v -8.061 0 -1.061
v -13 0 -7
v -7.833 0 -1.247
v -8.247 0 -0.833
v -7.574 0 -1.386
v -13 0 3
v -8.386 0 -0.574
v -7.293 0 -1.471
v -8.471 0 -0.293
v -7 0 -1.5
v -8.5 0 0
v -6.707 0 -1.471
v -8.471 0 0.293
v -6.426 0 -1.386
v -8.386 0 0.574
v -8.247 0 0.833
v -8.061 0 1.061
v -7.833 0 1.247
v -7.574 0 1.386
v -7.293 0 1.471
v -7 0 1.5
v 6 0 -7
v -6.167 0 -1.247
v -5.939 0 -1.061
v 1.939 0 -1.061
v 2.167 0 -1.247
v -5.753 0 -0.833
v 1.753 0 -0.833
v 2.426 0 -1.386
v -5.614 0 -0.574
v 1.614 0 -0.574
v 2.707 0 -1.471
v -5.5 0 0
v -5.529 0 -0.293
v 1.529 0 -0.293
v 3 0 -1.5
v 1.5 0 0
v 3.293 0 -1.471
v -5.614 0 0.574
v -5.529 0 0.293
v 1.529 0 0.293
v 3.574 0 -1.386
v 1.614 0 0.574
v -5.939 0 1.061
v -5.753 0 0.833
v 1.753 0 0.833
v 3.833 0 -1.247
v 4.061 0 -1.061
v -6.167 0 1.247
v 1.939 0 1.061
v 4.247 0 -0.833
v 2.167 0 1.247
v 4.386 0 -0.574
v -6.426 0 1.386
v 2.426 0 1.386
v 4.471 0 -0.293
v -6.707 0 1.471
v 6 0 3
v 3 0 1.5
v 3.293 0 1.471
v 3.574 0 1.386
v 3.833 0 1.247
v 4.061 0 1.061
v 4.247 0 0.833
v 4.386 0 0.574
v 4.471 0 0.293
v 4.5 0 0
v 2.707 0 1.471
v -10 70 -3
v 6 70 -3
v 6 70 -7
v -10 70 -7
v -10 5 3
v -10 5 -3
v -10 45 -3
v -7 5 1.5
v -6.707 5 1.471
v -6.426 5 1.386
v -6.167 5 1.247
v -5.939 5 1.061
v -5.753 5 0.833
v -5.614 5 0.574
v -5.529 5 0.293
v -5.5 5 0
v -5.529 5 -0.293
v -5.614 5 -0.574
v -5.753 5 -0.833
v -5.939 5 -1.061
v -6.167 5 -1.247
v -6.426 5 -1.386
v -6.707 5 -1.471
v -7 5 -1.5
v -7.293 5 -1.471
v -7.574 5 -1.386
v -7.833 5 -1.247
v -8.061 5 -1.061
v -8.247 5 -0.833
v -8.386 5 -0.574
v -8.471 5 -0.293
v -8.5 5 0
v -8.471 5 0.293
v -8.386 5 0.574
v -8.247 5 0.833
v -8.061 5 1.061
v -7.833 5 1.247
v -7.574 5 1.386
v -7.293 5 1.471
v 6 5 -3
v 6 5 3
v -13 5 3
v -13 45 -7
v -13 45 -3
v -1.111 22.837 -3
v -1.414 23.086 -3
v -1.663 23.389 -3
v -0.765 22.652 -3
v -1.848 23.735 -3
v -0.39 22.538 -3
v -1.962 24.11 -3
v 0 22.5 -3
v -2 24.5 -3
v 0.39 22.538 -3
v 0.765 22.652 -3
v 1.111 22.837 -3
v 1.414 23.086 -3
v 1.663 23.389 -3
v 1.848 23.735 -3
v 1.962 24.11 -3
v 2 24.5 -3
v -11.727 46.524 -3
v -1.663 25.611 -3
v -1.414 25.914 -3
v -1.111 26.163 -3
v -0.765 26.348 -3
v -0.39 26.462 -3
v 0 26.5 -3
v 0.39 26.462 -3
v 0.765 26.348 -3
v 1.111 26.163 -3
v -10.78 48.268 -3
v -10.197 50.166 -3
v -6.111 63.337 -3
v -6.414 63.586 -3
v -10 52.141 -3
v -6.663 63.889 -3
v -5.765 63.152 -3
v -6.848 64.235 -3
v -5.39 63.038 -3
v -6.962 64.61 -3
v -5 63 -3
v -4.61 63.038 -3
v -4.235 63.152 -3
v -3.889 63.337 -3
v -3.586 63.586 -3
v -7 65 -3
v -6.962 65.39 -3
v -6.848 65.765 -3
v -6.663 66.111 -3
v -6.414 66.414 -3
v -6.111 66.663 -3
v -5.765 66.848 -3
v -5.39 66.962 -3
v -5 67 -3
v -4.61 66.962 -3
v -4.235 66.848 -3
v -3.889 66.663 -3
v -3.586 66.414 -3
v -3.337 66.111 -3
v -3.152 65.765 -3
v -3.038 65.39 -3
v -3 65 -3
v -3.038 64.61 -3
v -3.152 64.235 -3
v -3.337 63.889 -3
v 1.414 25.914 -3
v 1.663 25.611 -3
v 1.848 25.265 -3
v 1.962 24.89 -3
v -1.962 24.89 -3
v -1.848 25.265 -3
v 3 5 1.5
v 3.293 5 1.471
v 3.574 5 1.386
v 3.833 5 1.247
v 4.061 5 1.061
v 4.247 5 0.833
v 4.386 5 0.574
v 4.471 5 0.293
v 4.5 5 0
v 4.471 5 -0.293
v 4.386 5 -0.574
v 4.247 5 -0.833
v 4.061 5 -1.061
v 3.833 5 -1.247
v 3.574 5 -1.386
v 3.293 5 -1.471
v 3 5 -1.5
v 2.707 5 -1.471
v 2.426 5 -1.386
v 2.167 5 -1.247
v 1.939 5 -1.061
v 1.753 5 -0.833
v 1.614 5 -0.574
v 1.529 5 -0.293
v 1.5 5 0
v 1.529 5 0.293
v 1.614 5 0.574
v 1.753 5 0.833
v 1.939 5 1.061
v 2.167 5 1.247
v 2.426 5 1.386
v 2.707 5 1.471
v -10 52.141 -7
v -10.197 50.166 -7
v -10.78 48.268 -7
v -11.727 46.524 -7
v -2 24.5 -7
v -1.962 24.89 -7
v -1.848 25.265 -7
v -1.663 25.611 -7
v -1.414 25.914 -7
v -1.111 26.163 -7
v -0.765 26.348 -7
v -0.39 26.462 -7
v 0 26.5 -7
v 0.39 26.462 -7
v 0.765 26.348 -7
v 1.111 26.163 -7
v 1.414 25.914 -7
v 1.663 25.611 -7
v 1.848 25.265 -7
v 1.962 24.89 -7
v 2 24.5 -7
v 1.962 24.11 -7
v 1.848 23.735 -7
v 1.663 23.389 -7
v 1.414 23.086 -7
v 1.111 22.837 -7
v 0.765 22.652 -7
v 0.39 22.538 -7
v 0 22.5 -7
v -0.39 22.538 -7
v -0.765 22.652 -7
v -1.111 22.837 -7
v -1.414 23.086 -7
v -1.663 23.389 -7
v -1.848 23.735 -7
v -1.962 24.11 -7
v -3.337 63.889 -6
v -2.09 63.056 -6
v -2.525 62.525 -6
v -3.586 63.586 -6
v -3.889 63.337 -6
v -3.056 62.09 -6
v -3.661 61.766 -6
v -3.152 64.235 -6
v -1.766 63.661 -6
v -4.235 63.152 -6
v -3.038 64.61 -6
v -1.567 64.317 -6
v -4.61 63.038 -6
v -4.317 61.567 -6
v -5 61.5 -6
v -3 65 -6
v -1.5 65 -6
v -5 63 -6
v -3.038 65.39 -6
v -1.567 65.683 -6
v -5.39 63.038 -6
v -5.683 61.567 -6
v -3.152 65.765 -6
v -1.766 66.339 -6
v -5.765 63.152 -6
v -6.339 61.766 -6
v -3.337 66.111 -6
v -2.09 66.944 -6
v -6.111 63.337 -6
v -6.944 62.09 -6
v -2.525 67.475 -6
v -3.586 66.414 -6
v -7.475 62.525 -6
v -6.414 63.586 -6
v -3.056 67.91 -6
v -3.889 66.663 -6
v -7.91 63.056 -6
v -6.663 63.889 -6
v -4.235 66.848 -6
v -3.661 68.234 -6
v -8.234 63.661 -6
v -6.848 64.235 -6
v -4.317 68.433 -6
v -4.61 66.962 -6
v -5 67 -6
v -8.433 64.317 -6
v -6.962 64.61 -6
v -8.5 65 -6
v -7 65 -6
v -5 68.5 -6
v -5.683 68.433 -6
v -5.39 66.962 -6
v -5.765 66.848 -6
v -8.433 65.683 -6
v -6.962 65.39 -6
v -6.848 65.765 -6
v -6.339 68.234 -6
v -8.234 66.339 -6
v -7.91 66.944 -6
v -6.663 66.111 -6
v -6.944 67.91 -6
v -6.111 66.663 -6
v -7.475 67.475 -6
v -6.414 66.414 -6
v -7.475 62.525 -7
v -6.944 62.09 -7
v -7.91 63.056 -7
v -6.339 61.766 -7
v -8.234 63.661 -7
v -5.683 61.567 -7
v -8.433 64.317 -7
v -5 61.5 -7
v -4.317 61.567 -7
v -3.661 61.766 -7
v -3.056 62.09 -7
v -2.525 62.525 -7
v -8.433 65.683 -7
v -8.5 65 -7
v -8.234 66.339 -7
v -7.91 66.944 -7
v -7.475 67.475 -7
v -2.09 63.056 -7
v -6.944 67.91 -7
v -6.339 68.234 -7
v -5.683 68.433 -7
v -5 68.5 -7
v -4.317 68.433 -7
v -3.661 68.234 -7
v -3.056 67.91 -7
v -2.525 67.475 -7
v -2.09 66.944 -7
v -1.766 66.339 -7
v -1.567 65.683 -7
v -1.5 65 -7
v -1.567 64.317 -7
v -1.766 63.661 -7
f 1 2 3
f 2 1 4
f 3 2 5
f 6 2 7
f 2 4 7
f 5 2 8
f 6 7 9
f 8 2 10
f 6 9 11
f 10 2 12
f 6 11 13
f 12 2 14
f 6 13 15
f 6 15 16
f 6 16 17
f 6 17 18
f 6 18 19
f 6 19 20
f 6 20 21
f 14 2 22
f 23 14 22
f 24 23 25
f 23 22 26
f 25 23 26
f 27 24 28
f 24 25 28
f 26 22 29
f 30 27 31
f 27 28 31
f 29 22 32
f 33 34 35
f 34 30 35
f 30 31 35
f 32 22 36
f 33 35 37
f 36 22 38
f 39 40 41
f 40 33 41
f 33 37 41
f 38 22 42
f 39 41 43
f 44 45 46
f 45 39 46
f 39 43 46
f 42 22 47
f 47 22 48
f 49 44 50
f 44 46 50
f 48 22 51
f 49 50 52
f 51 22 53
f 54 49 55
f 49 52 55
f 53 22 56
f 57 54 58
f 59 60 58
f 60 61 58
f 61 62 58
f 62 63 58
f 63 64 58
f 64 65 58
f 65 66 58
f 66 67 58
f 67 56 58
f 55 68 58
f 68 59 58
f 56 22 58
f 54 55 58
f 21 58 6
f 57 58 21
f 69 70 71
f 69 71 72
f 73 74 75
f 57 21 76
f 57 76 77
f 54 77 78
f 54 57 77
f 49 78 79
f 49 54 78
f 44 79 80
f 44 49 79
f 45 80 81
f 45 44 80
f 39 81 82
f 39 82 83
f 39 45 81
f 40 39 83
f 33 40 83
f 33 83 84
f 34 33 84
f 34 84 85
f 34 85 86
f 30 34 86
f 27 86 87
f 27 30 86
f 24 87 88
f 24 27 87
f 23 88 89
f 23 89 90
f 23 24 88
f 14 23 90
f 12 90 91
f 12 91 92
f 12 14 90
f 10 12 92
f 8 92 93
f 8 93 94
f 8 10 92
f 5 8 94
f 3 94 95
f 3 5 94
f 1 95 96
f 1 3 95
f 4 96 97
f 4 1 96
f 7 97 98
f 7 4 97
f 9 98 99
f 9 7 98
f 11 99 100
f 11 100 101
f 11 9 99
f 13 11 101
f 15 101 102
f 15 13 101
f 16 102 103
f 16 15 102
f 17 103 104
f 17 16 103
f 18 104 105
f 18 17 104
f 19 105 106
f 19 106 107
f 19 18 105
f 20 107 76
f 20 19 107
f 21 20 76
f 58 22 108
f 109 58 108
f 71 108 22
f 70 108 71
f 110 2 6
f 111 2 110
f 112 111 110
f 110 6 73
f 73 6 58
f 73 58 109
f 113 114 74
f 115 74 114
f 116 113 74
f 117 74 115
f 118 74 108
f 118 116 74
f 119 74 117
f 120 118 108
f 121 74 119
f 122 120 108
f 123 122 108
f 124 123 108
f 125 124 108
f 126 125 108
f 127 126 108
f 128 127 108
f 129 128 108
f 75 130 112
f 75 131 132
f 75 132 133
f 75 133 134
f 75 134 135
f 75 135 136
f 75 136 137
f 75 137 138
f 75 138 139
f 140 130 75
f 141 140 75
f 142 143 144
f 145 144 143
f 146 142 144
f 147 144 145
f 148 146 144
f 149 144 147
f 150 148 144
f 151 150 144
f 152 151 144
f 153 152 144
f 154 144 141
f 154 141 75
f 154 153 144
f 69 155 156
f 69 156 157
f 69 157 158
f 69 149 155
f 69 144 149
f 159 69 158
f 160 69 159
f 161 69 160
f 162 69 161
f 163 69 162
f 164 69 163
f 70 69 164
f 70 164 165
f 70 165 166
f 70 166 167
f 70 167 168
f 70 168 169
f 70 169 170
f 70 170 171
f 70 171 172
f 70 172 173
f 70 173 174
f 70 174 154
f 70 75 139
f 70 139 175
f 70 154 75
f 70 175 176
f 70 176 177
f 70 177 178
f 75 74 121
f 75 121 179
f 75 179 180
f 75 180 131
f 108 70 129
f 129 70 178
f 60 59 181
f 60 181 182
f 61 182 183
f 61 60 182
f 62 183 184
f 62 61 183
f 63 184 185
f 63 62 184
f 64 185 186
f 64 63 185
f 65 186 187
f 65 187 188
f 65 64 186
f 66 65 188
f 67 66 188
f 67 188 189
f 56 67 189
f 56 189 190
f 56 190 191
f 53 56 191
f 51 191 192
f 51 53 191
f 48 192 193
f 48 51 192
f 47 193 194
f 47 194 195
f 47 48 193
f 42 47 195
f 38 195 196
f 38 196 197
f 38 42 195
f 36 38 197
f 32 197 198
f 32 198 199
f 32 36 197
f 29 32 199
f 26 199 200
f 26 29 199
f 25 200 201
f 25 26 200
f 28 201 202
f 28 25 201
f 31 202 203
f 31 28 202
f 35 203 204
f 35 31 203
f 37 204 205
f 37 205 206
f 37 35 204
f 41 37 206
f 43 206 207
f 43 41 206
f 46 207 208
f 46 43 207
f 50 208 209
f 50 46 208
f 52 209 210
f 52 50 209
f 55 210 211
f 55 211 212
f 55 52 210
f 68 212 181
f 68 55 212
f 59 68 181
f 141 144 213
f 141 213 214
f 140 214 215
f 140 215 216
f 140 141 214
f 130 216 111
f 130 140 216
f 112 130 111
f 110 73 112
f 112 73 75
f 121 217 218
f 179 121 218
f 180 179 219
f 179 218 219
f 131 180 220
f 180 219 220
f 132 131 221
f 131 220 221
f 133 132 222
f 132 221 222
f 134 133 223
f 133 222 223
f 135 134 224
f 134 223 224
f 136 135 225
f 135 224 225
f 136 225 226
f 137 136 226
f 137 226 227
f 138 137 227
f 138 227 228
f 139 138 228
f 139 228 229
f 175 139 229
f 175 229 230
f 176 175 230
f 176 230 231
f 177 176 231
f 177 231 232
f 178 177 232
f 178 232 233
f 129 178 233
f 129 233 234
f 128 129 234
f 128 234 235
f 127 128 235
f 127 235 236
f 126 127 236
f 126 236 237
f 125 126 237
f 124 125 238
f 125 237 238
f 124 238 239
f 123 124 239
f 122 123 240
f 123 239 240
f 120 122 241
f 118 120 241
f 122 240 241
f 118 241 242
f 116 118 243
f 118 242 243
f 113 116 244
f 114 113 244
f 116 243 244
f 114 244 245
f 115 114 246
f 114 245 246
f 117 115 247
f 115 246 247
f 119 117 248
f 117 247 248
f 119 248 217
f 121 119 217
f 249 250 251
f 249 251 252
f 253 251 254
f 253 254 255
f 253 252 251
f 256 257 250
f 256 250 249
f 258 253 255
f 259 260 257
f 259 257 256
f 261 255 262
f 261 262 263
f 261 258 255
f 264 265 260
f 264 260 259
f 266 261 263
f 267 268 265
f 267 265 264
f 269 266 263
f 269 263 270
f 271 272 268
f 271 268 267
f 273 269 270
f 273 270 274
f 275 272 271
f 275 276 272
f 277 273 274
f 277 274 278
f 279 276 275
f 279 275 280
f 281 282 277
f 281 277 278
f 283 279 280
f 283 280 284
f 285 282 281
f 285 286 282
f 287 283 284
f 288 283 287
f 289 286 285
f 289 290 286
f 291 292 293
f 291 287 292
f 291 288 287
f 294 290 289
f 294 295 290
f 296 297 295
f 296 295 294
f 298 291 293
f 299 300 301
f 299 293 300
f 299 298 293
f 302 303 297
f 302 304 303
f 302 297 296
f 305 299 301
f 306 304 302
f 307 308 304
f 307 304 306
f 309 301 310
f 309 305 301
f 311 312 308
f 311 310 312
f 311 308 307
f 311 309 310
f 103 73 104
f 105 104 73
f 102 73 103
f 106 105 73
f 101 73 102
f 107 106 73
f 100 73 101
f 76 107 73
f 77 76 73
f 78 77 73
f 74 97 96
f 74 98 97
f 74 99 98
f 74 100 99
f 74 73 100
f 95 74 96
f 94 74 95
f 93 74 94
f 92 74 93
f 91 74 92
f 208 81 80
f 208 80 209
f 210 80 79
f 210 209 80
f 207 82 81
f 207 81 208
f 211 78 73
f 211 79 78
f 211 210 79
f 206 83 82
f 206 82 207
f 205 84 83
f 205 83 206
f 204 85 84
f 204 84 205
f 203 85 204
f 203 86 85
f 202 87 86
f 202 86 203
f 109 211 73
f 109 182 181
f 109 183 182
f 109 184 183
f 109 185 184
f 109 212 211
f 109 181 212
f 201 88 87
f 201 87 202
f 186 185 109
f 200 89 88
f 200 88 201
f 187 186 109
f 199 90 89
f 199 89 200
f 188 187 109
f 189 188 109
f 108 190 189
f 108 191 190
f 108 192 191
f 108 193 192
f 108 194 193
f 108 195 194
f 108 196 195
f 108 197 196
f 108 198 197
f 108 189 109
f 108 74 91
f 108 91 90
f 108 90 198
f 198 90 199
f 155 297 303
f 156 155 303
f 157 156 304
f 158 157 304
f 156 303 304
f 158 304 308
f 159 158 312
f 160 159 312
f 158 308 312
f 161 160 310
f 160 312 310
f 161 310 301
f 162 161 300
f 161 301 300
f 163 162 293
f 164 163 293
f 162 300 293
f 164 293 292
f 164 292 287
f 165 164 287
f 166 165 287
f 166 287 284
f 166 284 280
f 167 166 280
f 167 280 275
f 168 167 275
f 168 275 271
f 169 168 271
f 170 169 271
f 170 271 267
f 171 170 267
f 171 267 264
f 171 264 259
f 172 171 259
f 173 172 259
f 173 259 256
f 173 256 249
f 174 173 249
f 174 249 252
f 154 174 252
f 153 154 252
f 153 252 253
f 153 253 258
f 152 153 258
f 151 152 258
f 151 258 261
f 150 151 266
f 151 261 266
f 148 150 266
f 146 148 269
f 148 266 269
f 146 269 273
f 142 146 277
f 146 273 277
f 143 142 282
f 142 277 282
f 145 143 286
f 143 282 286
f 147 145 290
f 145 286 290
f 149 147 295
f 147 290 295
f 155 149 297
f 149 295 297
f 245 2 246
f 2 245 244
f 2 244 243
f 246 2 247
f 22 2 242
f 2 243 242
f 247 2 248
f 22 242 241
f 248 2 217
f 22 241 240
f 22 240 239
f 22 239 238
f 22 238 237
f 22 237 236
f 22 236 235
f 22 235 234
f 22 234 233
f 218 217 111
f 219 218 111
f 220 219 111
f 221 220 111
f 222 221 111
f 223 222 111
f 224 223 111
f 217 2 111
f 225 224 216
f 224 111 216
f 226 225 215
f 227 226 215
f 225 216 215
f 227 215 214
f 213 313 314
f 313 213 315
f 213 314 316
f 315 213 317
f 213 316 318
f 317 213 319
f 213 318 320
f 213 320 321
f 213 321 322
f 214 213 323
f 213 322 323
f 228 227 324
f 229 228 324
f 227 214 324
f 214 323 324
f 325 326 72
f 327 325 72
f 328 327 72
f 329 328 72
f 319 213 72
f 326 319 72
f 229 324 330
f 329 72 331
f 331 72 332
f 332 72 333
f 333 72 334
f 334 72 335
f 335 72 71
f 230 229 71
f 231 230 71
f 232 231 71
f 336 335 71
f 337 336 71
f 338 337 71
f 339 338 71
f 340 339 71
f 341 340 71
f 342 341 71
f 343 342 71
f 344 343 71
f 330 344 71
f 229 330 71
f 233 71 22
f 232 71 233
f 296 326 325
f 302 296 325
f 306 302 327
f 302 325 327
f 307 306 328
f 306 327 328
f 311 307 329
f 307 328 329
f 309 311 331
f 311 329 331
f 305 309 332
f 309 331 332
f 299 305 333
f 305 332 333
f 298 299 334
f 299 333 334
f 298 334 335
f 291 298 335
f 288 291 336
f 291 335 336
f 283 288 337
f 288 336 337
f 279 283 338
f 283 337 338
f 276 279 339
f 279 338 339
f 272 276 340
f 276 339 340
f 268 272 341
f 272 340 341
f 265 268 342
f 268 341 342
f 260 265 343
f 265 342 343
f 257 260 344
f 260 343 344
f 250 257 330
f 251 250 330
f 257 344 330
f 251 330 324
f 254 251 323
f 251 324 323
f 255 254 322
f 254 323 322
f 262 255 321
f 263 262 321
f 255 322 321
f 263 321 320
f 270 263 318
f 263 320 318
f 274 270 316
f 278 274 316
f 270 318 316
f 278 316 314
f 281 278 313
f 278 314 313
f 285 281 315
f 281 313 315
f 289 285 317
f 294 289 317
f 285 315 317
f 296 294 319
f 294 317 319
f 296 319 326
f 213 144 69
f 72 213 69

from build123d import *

# Parameters (mm, degrees)
SKETCH_1_W          = 16
SKETCH_1_H          = 6
SKETCH_1_R          = 1.5
EXTRUDE_1_DEPTH     = 5
SKETCH_2_W          = 16
SKETCH_2_H          = 70
EXTRUDE_2_DEPTH     = 4
SKETCH_3_R          = 2
CUT_EXTRUDE_1_DEPTH = 72.414284285
SKETCH_4_R          = 2
CUT_EXTRUDE_2_DEPTH = 72.414284285
SKETCH_5_R          = 3.5
CUT_EXTRUDE_3_DEPTH = 1
EXTRUDE_3_DEPTH     = 3
FILLET_1_R          = 10


with BuildPart() as part:
    # 草图1 → 凸台-拉伸1 (new body)
    with BuildSketch(Plane(origin=(0, 0, 0), x_dir=(1, 0, 0), z_dir=(0, 1, 0))):
        with Locations((-2, 0)):
            Rectangle(SKETCH_1_W, SKETCH_1_H)
        with Locations(Location((-7, 0, 0), (0, 0, 270))):
            Circle(SKETCH_1_R, mode=Mode.SUBTRACT)
        with Locations(Location((3, 0, 0), (0, 0, 270))):
            Circle(SKETCH_1_R, mode=Mode.SUBTRACT)
    extrude(amount=EXTRUDE_1_DEPTH)

    # 草图2 → 凸台-拉伸2 (add)
    with BuildSketch(Plane(origin=(0, 0, -3), x_dir=(-1, 0, 0), z_dir=(0, 0, -1))):
        with Locations((2, 35)):
            Rectangle(SKETCH_2_W, SKETCH_2_H)
    extrude(amount=EXTRUDE_2_DEPTH)

    # 草图3 → 切除-拉伸1 (cut, through all)
    with BuildSketch(Plane(origin=(0, 0, -7), x_dir=(-1, 0, 0), z_dir=(0, 0, -1))):
        with Locations((5, 65)):
            Circle(SKETCH_3_R)
    extrude(amount=-CUT_EXTRUDE_1_DEPTH, mode=Mode.SUBTRACT)

    # 草图4 → 切除-拉伸2 (cut, through all)
    with BuildSketch(Plane(origin=(0, 0, -7), x_dir=(-1, 0, 0), z_dir=(0, 0, -1))):
        with Locations((0, 24.5)):
            Circle(SKETCH_4_R)
    extrude(amount=-CUT_EXTRUDE_2_DEPTH, mode=Mode.SUBTRACT)

    # 草图5 → 切除-拉伸3 (cut)
    with BuildSketch(Plane(origin=(0, 0, -7), x_dir=(-1, 0, 0), z_dir=(0, 0, -1))):
        with Locations((5, 65)):
            Circle(SKETCH_5_R)
    extrude(amount=-CUT_EXTRUDE_3_DEPTH, mode=Mode.SUBTRACT)

    # 草图6 → 凸台-拉伸3 (add)
    with BuildSketch(Plane.ZY.offset(10)):
        Polygon((-3, 45), (-3, 5), (3, 5), align=None)
        Polygon((3, 5), (-3, 5), (-3, 45), (-7, 45), (-7, 0), (3, 0), align=None)
    extrude(amount=EXTRUDE_3_DEPTH)

    # 圆角1
    # the kernel refuses this fillet: 10 mm, written as the material it adds along each edge
    with BuildSketch(Plane(origin=(-10, 45, -3), x_dir=(-1, 0, 0), z_dir=(0, 0, -1))) as fillet_1_piece_1:
        with BuildLine():
            CenterArc((10, 7.141428429), FILLET_1_R, 180, 45.572995999)
            Line((0, 7.141428429), (0, 0))
            Line((0, 0), (3, 0))
        make_face()
    extrude(amount=4)


solid = part.part
